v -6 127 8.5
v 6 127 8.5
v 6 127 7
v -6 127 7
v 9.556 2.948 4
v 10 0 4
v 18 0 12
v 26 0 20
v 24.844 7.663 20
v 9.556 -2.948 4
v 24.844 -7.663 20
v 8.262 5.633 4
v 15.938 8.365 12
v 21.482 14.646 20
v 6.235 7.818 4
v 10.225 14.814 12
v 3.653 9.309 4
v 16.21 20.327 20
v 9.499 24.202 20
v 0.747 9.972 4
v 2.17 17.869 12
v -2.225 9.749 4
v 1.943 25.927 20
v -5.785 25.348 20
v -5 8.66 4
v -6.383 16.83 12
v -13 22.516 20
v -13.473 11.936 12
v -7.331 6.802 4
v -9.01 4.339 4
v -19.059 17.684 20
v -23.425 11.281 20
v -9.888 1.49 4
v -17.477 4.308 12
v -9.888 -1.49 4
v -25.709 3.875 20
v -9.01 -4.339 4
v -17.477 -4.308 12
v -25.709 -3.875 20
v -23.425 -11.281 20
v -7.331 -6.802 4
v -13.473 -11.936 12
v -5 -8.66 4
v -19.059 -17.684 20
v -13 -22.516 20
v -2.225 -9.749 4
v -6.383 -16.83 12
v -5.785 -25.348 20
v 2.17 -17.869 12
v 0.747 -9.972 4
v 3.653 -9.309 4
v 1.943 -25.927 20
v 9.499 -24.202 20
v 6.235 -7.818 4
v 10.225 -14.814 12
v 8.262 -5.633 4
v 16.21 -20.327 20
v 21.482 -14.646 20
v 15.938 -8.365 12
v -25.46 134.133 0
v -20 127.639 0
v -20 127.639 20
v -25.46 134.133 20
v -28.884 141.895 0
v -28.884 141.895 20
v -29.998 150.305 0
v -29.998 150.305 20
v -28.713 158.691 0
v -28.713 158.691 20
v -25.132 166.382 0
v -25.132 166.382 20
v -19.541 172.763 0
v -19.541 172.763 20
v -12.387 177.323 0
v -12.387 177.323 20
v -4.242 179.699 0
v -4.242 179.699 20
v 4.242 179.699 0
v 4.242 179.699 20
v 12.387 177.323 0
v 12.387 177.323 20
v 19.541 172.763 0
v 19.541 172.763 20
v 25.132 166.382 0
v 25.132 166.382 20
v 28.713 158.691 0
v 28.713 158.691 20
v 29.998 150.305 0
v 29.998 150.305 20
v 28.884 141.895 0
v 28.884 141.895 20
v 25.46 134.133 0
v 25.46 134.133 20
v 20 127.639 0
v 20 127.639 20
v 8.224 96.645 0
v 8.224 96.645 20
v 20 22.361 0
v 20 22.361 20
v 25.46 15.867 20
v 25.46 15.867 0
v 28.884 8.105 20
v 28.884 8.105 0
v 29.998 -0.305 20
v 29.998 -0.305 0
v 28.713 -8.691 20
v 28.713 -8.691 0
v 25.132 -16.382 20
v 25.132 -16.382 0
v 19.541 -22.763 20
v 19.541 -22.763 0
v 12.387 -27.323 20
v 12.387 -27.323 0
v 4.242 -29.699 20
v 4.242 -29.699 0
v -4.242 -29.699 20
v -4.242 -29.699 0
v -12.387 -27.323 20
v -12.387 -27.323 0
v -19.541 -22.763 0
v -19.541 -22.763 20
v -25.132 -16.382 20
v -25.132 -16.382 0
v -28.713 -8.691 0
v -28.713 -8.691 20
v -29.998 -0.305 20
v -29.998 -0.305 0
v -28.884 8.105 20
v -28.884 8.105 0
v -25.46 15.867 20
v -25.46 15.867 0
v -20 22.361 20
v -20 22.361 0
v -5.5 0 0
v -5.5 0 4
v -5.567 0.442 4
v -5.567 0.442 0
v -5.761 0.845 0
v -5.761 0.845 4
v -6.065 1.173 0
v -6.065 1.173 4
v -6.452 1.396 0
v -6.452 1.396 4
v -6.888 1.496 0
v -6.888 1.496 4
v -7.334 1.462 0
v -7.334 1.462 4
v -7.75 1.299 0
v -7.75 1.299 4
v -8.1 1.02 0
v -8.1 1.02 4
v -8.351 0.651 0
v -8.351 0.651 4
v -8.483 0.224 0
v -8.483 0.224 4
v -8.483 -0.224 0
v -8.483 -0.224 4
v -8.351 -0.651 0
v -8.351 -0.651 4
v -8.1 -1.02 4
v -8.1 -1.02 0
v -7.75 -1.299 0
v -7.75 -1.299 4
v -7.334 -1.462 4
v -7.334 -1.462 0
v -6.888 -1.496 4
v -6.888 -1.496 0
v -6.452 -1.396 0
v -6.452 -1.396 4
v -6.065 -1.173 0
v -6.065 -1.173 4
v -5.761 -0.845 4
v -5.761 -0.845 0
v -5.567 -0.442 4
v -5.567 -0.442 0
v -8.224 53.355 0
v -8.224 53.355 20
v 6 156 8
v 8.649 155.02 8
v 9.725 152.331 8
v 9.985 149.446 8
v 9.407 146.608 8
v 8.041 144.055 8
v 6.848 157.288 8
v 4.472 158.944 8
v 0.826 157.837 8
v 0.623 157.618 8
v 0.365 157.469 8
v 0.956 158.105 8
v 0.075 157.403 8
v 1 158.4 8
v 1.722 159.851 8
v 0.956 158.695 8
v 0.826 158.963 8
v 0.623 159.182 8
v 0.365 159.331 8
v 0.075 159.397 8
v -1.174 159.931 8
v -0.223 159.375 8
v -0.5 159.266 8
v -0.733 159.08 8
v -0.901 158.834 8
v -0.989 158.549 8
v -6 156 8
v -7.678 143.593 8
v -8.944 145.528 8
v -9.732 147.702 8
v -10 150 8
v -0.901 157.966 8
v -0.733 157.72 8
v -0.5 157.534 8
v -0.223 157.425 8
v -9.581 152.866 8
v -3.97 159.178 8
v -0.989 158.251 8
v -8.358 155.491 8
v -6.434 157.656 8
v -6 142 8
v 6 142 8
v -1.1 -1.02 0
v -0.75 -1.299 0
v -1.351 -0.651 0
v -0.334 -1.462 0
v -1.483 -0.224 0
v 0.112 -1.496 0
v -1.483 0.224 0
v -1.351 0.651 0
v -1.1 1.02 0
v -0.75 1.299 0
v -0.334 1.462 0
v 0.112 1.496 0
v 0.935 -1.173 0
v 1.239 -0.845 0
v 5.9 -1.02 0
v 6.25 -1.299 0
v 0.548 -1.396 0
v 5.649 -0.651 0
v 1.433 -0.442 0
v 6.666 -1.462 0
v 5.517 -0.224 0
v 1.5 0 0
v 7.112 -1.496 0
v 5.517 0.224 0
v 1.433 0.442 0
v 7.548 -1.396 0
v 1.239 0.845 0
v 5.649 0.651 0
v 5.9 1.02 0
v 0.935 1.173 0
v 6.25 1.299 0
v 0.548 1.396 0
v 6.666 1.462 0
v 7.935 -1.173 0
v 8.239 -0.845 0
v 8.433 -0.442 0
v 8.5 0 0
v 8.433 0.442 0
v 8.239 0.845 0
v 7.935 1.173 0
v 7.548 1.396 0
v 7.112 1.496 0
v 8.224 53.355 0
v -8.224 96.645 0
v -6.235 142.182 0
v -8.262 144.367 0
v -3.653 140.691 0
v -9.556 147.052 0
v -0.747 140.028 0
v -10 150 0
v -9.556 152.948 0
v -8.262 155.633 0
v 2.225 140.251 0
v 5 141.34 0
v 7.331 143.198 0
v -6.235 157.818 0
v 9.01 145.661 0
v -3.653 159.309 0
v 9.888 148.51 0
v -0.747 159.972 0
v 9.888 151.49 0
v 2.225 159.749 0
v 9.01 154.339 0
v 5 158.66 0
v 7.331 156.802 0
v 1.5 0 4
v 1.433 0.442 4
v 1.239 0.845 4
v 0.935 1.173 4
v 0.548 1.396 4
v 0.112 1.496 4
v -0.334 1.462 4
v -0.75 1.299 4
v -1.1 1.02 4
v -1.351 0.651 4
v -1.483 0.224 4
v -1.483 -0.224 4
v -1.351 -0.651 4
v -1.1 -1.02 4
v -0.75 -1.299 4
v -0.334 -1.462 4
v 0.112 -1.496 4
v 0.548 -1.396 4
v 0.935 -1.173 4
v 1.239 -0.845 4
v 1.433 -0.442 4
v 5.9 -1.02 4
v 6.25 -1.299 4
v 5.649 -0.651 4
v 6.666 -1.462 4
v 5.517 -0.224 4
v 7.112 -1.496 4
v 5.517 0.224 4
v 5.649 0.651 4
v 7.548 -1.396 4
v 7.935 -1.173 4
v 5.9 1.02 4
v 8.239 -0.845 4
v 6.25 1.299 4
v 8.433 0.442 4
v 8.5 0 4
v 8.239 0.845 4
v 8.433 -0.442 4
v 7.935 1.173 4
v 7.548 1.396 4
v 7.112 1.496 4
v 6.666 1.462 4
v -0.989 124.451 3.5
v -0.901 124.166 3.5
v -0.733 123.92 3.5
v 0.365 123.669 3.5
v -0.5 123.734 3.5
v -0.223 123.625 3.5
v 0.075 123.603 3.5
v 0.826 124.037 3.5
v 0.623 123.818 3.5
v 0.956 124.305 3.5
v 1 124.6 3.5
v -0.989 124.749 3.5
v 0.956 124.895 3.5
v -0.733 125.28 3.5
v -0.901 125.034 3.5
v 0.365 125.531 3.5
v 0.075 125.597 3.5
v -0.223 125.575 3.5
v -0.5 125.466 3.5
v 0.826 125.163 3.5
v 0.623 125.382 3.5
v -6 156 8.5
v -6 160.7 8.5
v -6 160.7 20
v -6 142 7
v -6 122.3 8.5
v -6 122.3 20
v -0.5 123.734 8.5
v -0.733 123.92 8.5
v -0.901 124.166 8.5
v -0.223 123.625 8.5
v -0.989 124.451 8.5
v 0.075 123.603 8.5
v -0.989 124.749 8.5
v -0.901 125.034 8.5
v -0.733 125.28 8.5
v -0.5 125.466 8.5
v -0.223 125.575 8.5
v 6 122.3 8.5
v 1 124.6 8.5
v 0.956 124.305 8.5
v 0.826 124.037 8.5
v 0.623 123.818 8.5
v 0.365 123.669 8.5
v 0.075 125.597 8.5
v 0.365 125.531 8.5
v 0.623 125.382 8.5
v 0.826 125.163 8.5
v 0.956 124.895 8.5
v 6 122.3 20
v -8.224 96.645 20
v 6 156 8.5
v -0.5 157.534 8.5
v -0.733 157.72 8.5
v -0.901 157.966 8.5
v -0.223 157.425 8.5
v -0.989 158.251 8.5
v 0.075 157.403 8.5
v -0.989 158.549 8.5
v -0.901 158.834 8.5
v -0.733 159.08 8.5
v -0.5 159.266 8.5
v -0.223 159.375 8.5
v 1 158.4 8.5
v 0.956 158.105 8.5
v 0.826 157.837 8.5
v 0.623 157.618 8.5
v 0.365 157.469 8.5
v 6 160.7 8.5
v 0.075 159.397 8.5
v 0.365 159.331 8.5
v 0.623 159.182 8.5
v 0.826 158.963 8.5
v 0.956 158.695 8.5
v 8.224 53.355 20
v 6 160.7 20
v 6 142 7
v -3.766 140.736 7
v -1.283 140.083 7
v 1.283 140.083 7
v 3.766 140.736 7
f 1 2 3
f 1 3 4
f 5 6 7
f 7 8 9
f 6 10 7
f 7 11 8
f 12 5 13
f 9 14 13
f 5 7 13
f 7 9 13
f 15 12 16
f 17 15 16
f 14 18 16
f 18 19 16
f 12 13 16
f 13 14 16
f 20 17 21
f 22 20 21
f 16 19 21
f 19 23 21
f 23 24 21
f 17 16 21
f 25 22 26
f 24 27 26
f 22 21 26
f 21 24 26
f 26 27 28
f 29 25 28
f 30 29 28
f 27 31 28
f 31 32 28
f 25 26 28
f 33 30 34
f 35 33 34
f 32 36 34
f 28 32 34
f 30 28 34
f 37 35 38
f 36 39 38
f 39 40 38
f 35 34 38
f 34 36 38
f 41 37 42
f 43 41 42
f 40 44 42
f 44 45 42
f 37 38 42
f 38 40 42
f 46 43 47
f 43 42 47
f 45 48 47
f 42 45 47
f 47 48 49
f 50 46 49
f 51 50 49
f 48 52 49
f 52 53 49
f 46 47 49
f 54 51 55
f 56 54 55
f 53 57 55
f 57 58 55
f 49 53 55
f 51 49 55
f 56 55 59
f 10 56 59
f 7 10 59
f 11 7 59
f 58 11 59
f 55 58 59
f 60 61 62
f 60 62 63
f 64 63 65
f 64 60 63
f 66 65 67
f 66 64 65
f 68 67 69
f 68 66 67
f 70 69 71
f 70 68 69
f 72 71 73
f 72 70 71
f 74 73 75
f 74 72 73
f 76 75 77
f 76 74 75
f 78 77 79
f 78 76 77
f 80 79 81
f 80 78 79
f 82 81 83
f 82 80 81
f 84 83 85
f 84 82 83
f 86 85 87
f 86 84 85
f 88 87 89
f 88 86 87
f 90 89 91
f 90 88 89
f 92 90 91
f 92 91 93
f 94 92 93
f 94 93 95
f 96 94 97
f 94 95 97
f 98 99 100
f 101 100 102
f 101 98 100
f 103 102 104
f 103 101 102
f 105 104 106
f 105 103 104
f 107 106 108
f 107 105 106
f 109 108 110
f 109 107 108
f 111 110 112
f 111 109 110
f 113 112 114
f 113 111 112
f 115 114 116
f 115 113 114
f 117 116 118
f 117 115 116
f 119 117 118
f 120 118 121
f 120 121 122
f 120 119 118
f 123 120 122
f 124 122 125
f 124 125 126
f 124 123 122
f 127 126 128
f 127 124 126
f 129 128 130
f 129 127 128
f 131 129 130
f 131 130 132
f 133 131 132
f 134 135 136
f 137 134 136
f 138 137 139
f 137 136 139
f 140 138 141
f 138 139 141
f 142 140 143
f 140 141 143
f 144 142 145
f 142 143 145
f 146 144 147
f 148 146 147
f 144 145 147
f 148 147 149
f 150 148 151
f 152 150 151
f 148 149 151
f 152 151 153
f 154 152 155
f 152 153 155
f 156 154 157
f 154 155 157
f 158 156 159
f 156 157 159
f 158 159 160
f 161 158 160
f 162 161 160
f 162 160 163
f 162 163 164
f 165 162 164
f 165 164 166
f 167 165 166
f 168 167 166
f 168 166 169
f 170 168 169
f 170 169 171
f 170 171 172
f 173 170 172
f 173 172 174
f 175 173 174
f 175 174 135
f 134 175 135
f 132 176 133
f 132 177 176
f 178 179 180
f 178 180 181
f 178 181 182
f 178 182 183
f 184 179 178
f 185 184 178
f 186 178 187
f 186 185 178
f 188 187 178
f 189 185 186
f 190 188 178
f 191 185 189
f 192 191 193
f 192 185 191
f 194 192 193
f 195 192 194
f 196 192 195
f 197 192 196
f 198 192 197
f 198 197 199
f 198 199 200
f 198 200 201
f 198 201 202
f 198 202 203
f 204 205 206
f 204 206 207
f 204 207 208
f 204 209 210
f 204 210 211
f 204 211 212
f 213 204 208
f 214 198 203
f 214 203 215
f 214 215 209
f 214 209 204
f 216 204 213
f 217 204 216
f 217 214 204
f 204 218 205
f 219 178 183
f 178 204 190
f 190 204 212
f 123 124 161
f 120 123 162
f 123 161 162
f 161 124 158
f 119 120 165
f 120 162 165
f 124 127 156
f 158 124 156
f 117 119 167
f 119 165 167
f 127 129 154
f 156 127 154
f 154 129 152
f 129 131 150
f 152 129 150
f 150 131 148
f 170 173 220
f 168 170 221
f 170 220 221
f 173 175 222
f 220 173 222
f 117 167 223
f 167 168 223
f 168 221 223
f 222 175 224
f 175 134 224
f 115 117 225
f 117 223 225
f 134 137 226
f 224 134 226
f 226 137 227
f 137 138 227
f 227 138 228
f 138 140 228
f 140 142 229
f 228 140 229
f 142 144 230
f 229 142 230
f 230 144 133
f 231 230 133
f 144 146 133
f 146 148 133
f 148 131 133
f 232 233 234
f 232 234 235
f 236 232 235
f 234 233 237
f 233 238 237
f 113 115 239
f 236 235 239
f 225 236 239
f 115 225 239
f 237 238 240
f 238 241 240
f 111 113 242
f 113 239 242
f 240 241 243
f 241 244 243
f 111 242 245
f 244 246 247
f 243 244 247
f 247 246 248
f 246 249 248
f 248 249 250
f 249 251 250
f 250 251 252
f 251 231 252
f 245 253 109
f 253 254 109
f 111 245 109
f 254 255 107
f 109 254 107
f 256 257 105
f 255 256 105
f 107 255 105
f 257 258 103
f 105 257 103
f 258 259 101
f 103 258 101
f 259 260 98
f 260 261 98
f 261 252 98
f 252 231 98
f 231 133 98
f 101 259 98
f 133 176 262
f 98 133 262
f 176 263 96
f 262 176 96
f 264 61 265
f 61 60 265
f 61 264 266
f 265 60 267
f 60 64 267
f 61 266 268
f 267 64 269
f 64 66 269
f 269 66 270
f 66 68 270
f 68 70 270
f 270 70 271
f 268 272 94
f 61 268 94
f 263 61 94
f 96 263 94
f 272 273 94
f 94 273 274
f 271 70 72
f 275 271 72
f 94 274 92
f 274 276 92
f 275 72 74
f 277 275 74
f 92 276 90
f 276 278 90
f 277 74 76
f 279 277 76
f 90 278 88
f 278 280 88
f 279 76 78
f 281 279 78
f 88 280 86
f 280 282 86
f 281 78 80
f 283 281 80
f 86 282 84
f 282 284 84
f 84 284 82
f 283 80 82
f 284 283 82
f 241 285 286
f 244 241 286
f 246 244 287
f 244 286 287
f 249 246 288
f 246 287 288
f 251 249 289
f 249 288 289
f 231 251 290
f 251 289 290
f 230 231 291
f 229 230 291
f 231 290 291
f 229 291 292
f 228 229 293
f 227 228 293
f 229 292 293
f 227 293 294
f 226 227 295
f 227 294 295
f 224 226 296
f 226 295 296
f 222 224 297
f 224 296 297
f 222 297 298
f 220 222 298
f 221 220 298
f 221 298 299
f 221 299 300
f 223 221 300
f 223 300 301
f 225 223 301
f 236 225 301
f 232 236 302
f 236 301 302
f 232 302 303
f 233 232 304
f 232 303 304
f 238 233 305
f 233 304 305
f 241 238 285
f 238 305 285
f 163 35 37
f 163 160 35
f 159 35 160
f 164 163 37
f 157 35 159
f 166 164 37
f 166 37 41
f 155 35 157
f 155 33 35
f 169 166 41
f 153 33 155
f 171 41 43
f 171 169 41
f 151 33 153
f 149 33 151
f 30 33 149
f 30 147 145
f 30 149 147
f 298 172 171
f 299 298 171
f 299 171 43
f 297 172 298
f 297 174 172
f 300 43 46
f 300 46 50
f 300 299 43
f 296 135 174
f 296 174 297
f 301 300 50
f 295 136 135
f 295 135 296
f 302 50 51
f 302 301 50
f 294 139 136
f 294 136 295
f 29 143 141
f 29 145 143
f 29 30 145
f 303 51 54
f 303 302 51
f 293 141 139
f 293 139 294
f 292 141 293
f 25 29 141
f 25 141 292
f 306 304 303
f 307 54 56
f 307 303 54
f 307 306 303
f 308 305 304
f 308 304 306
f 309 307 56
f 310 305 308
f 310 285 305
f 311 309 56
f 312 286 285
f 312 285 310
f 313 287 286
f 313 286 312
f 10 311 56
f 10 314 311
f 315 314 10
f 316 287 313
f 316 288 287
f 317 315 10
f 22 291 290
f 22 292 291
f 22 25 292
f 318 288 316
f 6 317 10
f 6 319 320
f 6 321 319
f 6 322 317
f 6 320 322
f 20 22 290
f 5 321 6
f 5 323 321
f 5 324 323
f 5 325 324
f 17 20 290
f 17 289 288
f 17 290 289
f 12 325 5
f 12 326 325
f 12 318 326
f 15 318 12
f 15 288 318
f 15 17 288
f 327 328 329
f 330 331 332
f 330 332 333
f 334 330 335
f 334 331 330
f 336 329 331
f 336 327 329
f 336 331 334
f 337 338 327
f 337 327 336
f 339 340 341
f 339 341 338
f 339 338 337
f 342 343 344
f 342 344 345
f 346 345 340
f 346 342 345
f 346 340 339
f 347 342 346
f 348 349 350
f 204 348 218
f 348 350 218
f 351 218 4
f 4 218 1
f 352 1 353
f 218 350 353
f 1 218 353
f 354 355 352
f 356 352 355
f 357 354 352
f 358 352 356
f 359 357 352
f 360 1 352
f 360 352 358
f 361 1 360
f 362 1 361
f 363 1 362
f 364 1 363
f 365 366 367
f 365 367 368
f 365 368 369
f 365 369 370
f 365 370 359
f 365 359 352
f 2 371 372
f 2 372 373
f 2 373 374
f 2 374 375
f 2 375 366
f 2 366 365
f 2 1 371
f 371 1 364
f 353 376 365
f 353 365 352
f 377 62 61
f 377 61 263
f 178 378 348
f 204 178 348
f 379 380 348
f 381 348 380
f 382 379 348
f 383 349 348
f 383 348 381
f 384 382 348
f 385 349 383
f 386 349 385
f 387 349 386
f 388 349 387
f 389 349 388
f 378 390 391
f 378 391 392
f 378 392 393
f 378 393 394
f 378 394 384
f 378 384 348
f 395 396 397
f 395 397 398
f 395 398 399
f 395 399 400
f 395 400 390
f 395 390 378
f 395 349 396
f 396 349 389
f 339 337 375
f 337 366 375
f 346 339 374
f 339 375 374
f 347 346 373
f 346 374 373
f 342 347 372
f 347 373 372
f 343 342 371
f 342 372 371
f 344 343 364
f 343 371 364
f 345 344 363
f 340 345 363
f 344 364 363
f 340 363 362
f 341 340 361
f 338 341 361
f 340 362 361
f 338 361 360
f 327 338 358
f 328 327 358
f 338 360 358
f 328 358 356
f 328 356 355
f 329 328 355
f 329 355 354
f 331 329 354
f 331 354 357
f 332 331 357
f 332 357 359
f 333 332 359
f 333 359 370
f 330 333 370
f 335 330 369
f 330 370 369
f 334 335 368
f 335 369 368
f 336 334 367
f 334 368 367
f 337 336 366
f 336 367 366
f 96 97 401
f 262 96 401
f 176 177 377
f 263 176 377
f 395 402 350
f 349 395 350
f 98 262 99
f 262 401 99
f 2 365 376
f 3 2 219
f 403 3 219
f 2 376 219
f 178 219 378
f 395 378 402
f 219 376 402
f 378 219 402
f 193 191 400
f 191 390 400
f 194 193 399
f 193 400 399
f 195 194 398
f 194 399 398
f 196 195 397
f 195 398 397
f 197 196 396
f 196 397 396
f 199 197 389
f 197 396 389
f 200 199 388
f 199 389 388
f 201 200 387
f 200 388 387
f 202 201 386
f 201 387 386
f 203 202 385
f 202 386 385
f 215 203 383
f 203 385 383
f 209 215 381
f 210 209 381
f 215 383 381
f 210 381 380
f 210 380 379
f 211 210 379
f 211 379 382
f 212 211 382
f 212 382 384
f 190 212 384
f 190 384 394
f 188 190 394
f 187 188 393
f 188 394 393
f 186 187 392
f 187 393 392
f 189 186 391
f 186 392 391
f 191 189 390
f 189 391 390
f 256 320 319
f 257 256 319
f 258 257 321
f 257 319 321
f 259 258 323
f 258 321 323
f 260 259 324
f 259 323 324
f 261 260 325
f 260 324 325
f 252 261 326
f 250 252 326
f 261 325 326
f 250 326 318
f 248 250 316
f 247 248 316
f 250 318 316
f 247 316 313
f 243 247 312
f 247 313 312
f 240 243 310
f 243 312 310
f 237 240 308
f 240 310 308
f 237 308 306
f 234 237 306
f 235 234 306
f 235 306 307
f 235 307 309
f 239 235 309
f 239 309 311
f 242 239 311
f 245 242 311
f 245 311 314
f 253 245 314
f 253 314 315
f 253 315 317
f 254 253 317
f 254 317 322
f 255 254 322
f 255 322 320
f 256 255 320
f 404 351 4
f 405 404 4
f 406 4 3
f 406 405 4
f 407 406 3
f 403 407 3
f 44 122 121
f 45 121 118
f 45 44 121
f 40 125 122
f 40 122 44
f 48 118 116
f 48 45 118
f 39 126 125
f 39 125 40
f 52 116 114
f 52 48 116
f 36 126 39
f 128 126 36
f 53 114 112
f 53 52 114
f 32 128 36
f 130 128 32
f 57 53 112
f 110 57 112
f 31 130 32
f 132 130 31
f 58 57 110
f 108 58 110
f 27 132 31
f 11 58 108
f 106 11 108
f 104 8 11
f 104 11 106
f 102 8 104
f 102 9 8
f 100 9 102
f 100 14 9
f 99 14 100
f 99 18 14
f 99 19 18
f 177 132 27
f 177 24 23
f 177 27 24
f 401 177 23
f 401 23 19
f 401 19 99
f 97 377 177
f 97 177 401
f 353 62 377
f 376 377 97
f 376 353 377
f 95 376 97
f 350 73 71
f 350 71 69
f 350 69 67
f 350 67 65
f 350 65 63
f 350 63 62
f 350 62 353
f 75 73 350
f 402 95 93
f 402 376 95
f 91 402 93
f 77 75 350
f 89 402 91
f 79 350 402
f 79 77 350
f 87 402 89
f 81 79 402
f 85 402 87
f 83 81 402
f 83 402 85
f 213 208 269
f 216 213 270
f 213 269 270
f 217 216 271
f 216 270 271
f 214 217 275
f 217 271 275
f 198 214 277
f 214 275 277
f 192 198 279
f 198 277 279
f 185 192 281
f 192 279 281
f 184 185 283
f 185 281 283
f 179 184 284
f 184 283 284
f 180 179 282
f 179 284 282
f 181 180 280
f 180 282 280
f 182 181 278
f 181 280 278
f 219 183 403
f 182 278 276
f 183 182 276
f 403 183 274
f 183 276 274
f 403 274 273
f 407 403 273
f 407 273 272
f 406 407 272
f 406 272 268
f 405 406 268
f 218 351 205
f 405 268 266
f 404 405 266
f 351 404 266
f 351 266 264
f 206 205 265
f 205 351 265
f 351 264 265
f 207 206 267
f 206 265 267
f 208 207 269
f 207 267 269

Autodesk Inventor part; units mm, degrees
ref_plane "YZ Plane" through (0, 0, 0) normal (1, 0, 0) x (0, 1, 0)
ref_plane "XZ Plane" through (0, 0, 0) normal (0, 1, 0) x (-1, 0, 0)
ref_plane "XY Plane" through (0, 0, 0) normal (0, 0, 1) x (1, 0, 0)
sketch "Sketch1" plane through (0, 0, 0) normal (0, 0, 1) x (1, 0, 0)
  circle A0 centre (0, 0) radius 30
  line L0 (0, 0) -> (20, 0)
  line L1 (20, 0) -> (20, 150)
  line L2 (20, 150) -> (0, 150)
  line L3 (0, 150) -> (0, 0)
  line L4 (0, 0) -> (-20, 0)
  line L5 (-20, 0) -> (-20, 150)
  line L6 (-20, 150) -> (0, 150)
  line L7 (0, 150) -> (0, 0)
  circle A1 centre (0, 150) radius 30
  point P0 (20, 127.6393)
  point P1 (-20, 127.6393)
  point P2 (-20, 22.3607)
  point P3 (20, 22.3607)
  dimension "d0" = 60
  dimension "d1" = 20
  dimension "d2" = 150
  dimension "d3" = 20
  dimension "d4" = 60
extrude "Extrusion1" add sketch "Sketch1" along normal blind 20
sketch "Sketch2" plane through (0, 0, 20) normal (0, 0, 1) x (1, 0, 0)
  circle A0 centre (0, 0) radius 10
  dimension "d7" = 20
extrude "Extrusion2" cut sketch "Sketch2" against normal blind 16
sketch "Sketch3" plane through (0, 0, 4) normal (0, 0, 1) x (1, 0, 0)
  circle A0 centre (0, 0) radius 1.5
  circle A1 centre (-7, 0) radius 1.5
  circle A2 centre (7, 0) radius 1.5
  dimension "d10" = 3
  dimension "d11" = 3
  dimension "d12" = 3
extrude "Extrusion3" cut sketch "Sketch3" against normal blind 25.275
sketch "Sketch4" plane through (0, 0, 20) normal (0, 0, 1) x (1, 0, 0)
  circle A0 centre (0, 150) radius 10
  line L0 (-10, 150) -> (10, 150)
  line L1 (10, 150) -> (10, 110)
  line L2 (10, 110) -> (-10, 110)
  line L3 (-10, 110) -> (-10, 150)
  circle A1 centre (0, 150) radius 6
  line L4 (-6, 150) -> (6, 150)
  line L5 (6, 150) -> (6, 127)
  line L6 (6, 127) -> (-6, 127)
  line L7 (-6, 127) -> (-6, 150)
  line L8 (-6, 150) -> (6, 150)
  line L9 (6, 150) -> (6, 156)
  line L10 (6, 156) -> (-6, 156)
  line L11 (-6, 156) -> (-6, 150)
  point P0 (0, 0)
  dimension "d15" = 20
  dimension "d17" = 12
  dimension "d16" = 40
  dimension "d18" = 23
extrude "Extrusion4" cut sketch "Sketch4" against normal blind 13 contours L5 L6 L7 A0 | A0 L7 A1 L5 | A1 L0 | L0 A1 | A1 L10 L9 | L11 L10 A1
sketch "Sketch5" plane through (0, 0, 20) normal (0, 0, 1) x (1, 0, 0)
  line L0 (6, 127) -> (-6, 127) projected
  line L1 (-6, 127) -> (6, 127)
  line L2 (6, 127) -> (6, 122.3)
  line L3 (6, 122.3) -> (-6, 122.3)
  line L4 (-6, 122.3) -> (-6, 127)
  line L5 (-6, 156) -> (6, 156) projected
  line L6 (-6, 156) -> (6, 156)
  line L7 (6, 156) -> (6, 160.7)
  line L8 (6, 160.7) -> (-6, 160.7)
  line L9 (-6, 160.7) -> (-6, 156)
  point P0 (0, 0)
  dimension "d21" = 4.7
  dimension "d22" = 4.7
extrude "Extrusion5" cut sketch "Sketch5" against normal blind 11.5
sketch "Sketch6" plane through (0, 0, 8.5) normal (0, 0, 1) x (1, 0, 0)
  line L0 (-6, 160.7) -> (6, 160.7) projected
  line L1 (6, 160.7) -> (6, 156) projected
  line L2 (-6, 160.7) -> (6, 160.7)
  line L3 (6, 160.7) -> (6, 158.4)
  line L4 (6, 158.4) -> (-6, 158.4)
  line L5 (-6, 158.4) -> (-6, 160.7)
  circle A0 centre (0, 158.4) radius 1
  line L6 (-6, 122.3) -> (-6, 127) projected
  line L7 (6, 127) -> (6, 122.3) projected
  line L8 (-6, 122.3) -> (6, 122.3)
  line L9 (6, 122.3) -> (6, 124.6)
  line L10 (6, 124.6) -> (-6, 124.6)
  line L11 (-6, 124.6) -> (-6, 122.3)
  circle A1 centre (0, 124.6) radius 1
  point P0 (0, 0)
  dimension "d25" = 2.3
  dimension "d26" = 2
  dimension "d27" = 2.3
  dimension "d28" = 2
extrude "Extrusion6" cut sketch "Sketch6" against normal blind 5 contours A0 L4 | L4 A0 | A1 L10 | L10 A1
sketch "Sketch7" plane through (0, 0, 0) normal (0, 0, -1) x (-1, 0, 0)
  circle A0 centre (0, 150) radius 10
  point P0 (0, 0)
  dimension "d31" = 20
extrude "Extrusion7" cut sketch "Sketch7" against normal blind 8
chamfer "Chamfer1" distance 16 angle 45 1 edges at (-10, 0, 20)
sketch "Sketch8" plane through (0, 0, 20) normal (0, 0, 1) x (1, 0, 0)
  arc A0 (20, 127.6393) -> (-20, 127.6393) centre (0, 150) ccw projected
  line L0 (-20, 127.6393) -> (-20, 22.3607) projected
  line L1 (20, 127.6393) -> (-20, 22.3607)
  line L2 (-20, 22.3607) -> (-20, 127.6393)
  line L3 (20, 22.3607) -> (20, 127.6393) projected
  line L4 (-20, 127.6393) -> (20, 22.3607)
  line L5 (20, 127.6393) -> (20, 22.3607)
  line L6 (0, 75) -> (8.2239, 75)
  line L7 (8.2239, 75) -> (8.2239, 53.3549)
  line L8 (8.2239, 53.3549) -> (0, 53.3549)
  line L9 (0, 53.3549) -> (0, 75)
  line L10 (0, 75) -> (-8.2239, 75)
  line L11 (-8.2239, 75) -> (-8.2239, 53.3549)
  line L12 (-8.2239, 53.3549) -> (0, 53.3549)
  line L13 (0, 53.3549) -> (0, 75)
  line L14 (8.2239, 75) -> (-8.2239, 75)
  line L15 (-8.2239, 75) -> (-8.2239, 96.6451)
  line L16 (-8.2239, 96.6451) -> (8.2239, 96.6451)
  line L17 (8.2239, 96.6451) -> (8.2239, 75)
  point P0 (0, 0)
extrude "Extrusion8" cut sketch "Sketch8" against normal blind 64.1375 contours L3 L4 L7 L17 L1 | L4 L15 L11 L1 L0
properties part number "1st-arm"
